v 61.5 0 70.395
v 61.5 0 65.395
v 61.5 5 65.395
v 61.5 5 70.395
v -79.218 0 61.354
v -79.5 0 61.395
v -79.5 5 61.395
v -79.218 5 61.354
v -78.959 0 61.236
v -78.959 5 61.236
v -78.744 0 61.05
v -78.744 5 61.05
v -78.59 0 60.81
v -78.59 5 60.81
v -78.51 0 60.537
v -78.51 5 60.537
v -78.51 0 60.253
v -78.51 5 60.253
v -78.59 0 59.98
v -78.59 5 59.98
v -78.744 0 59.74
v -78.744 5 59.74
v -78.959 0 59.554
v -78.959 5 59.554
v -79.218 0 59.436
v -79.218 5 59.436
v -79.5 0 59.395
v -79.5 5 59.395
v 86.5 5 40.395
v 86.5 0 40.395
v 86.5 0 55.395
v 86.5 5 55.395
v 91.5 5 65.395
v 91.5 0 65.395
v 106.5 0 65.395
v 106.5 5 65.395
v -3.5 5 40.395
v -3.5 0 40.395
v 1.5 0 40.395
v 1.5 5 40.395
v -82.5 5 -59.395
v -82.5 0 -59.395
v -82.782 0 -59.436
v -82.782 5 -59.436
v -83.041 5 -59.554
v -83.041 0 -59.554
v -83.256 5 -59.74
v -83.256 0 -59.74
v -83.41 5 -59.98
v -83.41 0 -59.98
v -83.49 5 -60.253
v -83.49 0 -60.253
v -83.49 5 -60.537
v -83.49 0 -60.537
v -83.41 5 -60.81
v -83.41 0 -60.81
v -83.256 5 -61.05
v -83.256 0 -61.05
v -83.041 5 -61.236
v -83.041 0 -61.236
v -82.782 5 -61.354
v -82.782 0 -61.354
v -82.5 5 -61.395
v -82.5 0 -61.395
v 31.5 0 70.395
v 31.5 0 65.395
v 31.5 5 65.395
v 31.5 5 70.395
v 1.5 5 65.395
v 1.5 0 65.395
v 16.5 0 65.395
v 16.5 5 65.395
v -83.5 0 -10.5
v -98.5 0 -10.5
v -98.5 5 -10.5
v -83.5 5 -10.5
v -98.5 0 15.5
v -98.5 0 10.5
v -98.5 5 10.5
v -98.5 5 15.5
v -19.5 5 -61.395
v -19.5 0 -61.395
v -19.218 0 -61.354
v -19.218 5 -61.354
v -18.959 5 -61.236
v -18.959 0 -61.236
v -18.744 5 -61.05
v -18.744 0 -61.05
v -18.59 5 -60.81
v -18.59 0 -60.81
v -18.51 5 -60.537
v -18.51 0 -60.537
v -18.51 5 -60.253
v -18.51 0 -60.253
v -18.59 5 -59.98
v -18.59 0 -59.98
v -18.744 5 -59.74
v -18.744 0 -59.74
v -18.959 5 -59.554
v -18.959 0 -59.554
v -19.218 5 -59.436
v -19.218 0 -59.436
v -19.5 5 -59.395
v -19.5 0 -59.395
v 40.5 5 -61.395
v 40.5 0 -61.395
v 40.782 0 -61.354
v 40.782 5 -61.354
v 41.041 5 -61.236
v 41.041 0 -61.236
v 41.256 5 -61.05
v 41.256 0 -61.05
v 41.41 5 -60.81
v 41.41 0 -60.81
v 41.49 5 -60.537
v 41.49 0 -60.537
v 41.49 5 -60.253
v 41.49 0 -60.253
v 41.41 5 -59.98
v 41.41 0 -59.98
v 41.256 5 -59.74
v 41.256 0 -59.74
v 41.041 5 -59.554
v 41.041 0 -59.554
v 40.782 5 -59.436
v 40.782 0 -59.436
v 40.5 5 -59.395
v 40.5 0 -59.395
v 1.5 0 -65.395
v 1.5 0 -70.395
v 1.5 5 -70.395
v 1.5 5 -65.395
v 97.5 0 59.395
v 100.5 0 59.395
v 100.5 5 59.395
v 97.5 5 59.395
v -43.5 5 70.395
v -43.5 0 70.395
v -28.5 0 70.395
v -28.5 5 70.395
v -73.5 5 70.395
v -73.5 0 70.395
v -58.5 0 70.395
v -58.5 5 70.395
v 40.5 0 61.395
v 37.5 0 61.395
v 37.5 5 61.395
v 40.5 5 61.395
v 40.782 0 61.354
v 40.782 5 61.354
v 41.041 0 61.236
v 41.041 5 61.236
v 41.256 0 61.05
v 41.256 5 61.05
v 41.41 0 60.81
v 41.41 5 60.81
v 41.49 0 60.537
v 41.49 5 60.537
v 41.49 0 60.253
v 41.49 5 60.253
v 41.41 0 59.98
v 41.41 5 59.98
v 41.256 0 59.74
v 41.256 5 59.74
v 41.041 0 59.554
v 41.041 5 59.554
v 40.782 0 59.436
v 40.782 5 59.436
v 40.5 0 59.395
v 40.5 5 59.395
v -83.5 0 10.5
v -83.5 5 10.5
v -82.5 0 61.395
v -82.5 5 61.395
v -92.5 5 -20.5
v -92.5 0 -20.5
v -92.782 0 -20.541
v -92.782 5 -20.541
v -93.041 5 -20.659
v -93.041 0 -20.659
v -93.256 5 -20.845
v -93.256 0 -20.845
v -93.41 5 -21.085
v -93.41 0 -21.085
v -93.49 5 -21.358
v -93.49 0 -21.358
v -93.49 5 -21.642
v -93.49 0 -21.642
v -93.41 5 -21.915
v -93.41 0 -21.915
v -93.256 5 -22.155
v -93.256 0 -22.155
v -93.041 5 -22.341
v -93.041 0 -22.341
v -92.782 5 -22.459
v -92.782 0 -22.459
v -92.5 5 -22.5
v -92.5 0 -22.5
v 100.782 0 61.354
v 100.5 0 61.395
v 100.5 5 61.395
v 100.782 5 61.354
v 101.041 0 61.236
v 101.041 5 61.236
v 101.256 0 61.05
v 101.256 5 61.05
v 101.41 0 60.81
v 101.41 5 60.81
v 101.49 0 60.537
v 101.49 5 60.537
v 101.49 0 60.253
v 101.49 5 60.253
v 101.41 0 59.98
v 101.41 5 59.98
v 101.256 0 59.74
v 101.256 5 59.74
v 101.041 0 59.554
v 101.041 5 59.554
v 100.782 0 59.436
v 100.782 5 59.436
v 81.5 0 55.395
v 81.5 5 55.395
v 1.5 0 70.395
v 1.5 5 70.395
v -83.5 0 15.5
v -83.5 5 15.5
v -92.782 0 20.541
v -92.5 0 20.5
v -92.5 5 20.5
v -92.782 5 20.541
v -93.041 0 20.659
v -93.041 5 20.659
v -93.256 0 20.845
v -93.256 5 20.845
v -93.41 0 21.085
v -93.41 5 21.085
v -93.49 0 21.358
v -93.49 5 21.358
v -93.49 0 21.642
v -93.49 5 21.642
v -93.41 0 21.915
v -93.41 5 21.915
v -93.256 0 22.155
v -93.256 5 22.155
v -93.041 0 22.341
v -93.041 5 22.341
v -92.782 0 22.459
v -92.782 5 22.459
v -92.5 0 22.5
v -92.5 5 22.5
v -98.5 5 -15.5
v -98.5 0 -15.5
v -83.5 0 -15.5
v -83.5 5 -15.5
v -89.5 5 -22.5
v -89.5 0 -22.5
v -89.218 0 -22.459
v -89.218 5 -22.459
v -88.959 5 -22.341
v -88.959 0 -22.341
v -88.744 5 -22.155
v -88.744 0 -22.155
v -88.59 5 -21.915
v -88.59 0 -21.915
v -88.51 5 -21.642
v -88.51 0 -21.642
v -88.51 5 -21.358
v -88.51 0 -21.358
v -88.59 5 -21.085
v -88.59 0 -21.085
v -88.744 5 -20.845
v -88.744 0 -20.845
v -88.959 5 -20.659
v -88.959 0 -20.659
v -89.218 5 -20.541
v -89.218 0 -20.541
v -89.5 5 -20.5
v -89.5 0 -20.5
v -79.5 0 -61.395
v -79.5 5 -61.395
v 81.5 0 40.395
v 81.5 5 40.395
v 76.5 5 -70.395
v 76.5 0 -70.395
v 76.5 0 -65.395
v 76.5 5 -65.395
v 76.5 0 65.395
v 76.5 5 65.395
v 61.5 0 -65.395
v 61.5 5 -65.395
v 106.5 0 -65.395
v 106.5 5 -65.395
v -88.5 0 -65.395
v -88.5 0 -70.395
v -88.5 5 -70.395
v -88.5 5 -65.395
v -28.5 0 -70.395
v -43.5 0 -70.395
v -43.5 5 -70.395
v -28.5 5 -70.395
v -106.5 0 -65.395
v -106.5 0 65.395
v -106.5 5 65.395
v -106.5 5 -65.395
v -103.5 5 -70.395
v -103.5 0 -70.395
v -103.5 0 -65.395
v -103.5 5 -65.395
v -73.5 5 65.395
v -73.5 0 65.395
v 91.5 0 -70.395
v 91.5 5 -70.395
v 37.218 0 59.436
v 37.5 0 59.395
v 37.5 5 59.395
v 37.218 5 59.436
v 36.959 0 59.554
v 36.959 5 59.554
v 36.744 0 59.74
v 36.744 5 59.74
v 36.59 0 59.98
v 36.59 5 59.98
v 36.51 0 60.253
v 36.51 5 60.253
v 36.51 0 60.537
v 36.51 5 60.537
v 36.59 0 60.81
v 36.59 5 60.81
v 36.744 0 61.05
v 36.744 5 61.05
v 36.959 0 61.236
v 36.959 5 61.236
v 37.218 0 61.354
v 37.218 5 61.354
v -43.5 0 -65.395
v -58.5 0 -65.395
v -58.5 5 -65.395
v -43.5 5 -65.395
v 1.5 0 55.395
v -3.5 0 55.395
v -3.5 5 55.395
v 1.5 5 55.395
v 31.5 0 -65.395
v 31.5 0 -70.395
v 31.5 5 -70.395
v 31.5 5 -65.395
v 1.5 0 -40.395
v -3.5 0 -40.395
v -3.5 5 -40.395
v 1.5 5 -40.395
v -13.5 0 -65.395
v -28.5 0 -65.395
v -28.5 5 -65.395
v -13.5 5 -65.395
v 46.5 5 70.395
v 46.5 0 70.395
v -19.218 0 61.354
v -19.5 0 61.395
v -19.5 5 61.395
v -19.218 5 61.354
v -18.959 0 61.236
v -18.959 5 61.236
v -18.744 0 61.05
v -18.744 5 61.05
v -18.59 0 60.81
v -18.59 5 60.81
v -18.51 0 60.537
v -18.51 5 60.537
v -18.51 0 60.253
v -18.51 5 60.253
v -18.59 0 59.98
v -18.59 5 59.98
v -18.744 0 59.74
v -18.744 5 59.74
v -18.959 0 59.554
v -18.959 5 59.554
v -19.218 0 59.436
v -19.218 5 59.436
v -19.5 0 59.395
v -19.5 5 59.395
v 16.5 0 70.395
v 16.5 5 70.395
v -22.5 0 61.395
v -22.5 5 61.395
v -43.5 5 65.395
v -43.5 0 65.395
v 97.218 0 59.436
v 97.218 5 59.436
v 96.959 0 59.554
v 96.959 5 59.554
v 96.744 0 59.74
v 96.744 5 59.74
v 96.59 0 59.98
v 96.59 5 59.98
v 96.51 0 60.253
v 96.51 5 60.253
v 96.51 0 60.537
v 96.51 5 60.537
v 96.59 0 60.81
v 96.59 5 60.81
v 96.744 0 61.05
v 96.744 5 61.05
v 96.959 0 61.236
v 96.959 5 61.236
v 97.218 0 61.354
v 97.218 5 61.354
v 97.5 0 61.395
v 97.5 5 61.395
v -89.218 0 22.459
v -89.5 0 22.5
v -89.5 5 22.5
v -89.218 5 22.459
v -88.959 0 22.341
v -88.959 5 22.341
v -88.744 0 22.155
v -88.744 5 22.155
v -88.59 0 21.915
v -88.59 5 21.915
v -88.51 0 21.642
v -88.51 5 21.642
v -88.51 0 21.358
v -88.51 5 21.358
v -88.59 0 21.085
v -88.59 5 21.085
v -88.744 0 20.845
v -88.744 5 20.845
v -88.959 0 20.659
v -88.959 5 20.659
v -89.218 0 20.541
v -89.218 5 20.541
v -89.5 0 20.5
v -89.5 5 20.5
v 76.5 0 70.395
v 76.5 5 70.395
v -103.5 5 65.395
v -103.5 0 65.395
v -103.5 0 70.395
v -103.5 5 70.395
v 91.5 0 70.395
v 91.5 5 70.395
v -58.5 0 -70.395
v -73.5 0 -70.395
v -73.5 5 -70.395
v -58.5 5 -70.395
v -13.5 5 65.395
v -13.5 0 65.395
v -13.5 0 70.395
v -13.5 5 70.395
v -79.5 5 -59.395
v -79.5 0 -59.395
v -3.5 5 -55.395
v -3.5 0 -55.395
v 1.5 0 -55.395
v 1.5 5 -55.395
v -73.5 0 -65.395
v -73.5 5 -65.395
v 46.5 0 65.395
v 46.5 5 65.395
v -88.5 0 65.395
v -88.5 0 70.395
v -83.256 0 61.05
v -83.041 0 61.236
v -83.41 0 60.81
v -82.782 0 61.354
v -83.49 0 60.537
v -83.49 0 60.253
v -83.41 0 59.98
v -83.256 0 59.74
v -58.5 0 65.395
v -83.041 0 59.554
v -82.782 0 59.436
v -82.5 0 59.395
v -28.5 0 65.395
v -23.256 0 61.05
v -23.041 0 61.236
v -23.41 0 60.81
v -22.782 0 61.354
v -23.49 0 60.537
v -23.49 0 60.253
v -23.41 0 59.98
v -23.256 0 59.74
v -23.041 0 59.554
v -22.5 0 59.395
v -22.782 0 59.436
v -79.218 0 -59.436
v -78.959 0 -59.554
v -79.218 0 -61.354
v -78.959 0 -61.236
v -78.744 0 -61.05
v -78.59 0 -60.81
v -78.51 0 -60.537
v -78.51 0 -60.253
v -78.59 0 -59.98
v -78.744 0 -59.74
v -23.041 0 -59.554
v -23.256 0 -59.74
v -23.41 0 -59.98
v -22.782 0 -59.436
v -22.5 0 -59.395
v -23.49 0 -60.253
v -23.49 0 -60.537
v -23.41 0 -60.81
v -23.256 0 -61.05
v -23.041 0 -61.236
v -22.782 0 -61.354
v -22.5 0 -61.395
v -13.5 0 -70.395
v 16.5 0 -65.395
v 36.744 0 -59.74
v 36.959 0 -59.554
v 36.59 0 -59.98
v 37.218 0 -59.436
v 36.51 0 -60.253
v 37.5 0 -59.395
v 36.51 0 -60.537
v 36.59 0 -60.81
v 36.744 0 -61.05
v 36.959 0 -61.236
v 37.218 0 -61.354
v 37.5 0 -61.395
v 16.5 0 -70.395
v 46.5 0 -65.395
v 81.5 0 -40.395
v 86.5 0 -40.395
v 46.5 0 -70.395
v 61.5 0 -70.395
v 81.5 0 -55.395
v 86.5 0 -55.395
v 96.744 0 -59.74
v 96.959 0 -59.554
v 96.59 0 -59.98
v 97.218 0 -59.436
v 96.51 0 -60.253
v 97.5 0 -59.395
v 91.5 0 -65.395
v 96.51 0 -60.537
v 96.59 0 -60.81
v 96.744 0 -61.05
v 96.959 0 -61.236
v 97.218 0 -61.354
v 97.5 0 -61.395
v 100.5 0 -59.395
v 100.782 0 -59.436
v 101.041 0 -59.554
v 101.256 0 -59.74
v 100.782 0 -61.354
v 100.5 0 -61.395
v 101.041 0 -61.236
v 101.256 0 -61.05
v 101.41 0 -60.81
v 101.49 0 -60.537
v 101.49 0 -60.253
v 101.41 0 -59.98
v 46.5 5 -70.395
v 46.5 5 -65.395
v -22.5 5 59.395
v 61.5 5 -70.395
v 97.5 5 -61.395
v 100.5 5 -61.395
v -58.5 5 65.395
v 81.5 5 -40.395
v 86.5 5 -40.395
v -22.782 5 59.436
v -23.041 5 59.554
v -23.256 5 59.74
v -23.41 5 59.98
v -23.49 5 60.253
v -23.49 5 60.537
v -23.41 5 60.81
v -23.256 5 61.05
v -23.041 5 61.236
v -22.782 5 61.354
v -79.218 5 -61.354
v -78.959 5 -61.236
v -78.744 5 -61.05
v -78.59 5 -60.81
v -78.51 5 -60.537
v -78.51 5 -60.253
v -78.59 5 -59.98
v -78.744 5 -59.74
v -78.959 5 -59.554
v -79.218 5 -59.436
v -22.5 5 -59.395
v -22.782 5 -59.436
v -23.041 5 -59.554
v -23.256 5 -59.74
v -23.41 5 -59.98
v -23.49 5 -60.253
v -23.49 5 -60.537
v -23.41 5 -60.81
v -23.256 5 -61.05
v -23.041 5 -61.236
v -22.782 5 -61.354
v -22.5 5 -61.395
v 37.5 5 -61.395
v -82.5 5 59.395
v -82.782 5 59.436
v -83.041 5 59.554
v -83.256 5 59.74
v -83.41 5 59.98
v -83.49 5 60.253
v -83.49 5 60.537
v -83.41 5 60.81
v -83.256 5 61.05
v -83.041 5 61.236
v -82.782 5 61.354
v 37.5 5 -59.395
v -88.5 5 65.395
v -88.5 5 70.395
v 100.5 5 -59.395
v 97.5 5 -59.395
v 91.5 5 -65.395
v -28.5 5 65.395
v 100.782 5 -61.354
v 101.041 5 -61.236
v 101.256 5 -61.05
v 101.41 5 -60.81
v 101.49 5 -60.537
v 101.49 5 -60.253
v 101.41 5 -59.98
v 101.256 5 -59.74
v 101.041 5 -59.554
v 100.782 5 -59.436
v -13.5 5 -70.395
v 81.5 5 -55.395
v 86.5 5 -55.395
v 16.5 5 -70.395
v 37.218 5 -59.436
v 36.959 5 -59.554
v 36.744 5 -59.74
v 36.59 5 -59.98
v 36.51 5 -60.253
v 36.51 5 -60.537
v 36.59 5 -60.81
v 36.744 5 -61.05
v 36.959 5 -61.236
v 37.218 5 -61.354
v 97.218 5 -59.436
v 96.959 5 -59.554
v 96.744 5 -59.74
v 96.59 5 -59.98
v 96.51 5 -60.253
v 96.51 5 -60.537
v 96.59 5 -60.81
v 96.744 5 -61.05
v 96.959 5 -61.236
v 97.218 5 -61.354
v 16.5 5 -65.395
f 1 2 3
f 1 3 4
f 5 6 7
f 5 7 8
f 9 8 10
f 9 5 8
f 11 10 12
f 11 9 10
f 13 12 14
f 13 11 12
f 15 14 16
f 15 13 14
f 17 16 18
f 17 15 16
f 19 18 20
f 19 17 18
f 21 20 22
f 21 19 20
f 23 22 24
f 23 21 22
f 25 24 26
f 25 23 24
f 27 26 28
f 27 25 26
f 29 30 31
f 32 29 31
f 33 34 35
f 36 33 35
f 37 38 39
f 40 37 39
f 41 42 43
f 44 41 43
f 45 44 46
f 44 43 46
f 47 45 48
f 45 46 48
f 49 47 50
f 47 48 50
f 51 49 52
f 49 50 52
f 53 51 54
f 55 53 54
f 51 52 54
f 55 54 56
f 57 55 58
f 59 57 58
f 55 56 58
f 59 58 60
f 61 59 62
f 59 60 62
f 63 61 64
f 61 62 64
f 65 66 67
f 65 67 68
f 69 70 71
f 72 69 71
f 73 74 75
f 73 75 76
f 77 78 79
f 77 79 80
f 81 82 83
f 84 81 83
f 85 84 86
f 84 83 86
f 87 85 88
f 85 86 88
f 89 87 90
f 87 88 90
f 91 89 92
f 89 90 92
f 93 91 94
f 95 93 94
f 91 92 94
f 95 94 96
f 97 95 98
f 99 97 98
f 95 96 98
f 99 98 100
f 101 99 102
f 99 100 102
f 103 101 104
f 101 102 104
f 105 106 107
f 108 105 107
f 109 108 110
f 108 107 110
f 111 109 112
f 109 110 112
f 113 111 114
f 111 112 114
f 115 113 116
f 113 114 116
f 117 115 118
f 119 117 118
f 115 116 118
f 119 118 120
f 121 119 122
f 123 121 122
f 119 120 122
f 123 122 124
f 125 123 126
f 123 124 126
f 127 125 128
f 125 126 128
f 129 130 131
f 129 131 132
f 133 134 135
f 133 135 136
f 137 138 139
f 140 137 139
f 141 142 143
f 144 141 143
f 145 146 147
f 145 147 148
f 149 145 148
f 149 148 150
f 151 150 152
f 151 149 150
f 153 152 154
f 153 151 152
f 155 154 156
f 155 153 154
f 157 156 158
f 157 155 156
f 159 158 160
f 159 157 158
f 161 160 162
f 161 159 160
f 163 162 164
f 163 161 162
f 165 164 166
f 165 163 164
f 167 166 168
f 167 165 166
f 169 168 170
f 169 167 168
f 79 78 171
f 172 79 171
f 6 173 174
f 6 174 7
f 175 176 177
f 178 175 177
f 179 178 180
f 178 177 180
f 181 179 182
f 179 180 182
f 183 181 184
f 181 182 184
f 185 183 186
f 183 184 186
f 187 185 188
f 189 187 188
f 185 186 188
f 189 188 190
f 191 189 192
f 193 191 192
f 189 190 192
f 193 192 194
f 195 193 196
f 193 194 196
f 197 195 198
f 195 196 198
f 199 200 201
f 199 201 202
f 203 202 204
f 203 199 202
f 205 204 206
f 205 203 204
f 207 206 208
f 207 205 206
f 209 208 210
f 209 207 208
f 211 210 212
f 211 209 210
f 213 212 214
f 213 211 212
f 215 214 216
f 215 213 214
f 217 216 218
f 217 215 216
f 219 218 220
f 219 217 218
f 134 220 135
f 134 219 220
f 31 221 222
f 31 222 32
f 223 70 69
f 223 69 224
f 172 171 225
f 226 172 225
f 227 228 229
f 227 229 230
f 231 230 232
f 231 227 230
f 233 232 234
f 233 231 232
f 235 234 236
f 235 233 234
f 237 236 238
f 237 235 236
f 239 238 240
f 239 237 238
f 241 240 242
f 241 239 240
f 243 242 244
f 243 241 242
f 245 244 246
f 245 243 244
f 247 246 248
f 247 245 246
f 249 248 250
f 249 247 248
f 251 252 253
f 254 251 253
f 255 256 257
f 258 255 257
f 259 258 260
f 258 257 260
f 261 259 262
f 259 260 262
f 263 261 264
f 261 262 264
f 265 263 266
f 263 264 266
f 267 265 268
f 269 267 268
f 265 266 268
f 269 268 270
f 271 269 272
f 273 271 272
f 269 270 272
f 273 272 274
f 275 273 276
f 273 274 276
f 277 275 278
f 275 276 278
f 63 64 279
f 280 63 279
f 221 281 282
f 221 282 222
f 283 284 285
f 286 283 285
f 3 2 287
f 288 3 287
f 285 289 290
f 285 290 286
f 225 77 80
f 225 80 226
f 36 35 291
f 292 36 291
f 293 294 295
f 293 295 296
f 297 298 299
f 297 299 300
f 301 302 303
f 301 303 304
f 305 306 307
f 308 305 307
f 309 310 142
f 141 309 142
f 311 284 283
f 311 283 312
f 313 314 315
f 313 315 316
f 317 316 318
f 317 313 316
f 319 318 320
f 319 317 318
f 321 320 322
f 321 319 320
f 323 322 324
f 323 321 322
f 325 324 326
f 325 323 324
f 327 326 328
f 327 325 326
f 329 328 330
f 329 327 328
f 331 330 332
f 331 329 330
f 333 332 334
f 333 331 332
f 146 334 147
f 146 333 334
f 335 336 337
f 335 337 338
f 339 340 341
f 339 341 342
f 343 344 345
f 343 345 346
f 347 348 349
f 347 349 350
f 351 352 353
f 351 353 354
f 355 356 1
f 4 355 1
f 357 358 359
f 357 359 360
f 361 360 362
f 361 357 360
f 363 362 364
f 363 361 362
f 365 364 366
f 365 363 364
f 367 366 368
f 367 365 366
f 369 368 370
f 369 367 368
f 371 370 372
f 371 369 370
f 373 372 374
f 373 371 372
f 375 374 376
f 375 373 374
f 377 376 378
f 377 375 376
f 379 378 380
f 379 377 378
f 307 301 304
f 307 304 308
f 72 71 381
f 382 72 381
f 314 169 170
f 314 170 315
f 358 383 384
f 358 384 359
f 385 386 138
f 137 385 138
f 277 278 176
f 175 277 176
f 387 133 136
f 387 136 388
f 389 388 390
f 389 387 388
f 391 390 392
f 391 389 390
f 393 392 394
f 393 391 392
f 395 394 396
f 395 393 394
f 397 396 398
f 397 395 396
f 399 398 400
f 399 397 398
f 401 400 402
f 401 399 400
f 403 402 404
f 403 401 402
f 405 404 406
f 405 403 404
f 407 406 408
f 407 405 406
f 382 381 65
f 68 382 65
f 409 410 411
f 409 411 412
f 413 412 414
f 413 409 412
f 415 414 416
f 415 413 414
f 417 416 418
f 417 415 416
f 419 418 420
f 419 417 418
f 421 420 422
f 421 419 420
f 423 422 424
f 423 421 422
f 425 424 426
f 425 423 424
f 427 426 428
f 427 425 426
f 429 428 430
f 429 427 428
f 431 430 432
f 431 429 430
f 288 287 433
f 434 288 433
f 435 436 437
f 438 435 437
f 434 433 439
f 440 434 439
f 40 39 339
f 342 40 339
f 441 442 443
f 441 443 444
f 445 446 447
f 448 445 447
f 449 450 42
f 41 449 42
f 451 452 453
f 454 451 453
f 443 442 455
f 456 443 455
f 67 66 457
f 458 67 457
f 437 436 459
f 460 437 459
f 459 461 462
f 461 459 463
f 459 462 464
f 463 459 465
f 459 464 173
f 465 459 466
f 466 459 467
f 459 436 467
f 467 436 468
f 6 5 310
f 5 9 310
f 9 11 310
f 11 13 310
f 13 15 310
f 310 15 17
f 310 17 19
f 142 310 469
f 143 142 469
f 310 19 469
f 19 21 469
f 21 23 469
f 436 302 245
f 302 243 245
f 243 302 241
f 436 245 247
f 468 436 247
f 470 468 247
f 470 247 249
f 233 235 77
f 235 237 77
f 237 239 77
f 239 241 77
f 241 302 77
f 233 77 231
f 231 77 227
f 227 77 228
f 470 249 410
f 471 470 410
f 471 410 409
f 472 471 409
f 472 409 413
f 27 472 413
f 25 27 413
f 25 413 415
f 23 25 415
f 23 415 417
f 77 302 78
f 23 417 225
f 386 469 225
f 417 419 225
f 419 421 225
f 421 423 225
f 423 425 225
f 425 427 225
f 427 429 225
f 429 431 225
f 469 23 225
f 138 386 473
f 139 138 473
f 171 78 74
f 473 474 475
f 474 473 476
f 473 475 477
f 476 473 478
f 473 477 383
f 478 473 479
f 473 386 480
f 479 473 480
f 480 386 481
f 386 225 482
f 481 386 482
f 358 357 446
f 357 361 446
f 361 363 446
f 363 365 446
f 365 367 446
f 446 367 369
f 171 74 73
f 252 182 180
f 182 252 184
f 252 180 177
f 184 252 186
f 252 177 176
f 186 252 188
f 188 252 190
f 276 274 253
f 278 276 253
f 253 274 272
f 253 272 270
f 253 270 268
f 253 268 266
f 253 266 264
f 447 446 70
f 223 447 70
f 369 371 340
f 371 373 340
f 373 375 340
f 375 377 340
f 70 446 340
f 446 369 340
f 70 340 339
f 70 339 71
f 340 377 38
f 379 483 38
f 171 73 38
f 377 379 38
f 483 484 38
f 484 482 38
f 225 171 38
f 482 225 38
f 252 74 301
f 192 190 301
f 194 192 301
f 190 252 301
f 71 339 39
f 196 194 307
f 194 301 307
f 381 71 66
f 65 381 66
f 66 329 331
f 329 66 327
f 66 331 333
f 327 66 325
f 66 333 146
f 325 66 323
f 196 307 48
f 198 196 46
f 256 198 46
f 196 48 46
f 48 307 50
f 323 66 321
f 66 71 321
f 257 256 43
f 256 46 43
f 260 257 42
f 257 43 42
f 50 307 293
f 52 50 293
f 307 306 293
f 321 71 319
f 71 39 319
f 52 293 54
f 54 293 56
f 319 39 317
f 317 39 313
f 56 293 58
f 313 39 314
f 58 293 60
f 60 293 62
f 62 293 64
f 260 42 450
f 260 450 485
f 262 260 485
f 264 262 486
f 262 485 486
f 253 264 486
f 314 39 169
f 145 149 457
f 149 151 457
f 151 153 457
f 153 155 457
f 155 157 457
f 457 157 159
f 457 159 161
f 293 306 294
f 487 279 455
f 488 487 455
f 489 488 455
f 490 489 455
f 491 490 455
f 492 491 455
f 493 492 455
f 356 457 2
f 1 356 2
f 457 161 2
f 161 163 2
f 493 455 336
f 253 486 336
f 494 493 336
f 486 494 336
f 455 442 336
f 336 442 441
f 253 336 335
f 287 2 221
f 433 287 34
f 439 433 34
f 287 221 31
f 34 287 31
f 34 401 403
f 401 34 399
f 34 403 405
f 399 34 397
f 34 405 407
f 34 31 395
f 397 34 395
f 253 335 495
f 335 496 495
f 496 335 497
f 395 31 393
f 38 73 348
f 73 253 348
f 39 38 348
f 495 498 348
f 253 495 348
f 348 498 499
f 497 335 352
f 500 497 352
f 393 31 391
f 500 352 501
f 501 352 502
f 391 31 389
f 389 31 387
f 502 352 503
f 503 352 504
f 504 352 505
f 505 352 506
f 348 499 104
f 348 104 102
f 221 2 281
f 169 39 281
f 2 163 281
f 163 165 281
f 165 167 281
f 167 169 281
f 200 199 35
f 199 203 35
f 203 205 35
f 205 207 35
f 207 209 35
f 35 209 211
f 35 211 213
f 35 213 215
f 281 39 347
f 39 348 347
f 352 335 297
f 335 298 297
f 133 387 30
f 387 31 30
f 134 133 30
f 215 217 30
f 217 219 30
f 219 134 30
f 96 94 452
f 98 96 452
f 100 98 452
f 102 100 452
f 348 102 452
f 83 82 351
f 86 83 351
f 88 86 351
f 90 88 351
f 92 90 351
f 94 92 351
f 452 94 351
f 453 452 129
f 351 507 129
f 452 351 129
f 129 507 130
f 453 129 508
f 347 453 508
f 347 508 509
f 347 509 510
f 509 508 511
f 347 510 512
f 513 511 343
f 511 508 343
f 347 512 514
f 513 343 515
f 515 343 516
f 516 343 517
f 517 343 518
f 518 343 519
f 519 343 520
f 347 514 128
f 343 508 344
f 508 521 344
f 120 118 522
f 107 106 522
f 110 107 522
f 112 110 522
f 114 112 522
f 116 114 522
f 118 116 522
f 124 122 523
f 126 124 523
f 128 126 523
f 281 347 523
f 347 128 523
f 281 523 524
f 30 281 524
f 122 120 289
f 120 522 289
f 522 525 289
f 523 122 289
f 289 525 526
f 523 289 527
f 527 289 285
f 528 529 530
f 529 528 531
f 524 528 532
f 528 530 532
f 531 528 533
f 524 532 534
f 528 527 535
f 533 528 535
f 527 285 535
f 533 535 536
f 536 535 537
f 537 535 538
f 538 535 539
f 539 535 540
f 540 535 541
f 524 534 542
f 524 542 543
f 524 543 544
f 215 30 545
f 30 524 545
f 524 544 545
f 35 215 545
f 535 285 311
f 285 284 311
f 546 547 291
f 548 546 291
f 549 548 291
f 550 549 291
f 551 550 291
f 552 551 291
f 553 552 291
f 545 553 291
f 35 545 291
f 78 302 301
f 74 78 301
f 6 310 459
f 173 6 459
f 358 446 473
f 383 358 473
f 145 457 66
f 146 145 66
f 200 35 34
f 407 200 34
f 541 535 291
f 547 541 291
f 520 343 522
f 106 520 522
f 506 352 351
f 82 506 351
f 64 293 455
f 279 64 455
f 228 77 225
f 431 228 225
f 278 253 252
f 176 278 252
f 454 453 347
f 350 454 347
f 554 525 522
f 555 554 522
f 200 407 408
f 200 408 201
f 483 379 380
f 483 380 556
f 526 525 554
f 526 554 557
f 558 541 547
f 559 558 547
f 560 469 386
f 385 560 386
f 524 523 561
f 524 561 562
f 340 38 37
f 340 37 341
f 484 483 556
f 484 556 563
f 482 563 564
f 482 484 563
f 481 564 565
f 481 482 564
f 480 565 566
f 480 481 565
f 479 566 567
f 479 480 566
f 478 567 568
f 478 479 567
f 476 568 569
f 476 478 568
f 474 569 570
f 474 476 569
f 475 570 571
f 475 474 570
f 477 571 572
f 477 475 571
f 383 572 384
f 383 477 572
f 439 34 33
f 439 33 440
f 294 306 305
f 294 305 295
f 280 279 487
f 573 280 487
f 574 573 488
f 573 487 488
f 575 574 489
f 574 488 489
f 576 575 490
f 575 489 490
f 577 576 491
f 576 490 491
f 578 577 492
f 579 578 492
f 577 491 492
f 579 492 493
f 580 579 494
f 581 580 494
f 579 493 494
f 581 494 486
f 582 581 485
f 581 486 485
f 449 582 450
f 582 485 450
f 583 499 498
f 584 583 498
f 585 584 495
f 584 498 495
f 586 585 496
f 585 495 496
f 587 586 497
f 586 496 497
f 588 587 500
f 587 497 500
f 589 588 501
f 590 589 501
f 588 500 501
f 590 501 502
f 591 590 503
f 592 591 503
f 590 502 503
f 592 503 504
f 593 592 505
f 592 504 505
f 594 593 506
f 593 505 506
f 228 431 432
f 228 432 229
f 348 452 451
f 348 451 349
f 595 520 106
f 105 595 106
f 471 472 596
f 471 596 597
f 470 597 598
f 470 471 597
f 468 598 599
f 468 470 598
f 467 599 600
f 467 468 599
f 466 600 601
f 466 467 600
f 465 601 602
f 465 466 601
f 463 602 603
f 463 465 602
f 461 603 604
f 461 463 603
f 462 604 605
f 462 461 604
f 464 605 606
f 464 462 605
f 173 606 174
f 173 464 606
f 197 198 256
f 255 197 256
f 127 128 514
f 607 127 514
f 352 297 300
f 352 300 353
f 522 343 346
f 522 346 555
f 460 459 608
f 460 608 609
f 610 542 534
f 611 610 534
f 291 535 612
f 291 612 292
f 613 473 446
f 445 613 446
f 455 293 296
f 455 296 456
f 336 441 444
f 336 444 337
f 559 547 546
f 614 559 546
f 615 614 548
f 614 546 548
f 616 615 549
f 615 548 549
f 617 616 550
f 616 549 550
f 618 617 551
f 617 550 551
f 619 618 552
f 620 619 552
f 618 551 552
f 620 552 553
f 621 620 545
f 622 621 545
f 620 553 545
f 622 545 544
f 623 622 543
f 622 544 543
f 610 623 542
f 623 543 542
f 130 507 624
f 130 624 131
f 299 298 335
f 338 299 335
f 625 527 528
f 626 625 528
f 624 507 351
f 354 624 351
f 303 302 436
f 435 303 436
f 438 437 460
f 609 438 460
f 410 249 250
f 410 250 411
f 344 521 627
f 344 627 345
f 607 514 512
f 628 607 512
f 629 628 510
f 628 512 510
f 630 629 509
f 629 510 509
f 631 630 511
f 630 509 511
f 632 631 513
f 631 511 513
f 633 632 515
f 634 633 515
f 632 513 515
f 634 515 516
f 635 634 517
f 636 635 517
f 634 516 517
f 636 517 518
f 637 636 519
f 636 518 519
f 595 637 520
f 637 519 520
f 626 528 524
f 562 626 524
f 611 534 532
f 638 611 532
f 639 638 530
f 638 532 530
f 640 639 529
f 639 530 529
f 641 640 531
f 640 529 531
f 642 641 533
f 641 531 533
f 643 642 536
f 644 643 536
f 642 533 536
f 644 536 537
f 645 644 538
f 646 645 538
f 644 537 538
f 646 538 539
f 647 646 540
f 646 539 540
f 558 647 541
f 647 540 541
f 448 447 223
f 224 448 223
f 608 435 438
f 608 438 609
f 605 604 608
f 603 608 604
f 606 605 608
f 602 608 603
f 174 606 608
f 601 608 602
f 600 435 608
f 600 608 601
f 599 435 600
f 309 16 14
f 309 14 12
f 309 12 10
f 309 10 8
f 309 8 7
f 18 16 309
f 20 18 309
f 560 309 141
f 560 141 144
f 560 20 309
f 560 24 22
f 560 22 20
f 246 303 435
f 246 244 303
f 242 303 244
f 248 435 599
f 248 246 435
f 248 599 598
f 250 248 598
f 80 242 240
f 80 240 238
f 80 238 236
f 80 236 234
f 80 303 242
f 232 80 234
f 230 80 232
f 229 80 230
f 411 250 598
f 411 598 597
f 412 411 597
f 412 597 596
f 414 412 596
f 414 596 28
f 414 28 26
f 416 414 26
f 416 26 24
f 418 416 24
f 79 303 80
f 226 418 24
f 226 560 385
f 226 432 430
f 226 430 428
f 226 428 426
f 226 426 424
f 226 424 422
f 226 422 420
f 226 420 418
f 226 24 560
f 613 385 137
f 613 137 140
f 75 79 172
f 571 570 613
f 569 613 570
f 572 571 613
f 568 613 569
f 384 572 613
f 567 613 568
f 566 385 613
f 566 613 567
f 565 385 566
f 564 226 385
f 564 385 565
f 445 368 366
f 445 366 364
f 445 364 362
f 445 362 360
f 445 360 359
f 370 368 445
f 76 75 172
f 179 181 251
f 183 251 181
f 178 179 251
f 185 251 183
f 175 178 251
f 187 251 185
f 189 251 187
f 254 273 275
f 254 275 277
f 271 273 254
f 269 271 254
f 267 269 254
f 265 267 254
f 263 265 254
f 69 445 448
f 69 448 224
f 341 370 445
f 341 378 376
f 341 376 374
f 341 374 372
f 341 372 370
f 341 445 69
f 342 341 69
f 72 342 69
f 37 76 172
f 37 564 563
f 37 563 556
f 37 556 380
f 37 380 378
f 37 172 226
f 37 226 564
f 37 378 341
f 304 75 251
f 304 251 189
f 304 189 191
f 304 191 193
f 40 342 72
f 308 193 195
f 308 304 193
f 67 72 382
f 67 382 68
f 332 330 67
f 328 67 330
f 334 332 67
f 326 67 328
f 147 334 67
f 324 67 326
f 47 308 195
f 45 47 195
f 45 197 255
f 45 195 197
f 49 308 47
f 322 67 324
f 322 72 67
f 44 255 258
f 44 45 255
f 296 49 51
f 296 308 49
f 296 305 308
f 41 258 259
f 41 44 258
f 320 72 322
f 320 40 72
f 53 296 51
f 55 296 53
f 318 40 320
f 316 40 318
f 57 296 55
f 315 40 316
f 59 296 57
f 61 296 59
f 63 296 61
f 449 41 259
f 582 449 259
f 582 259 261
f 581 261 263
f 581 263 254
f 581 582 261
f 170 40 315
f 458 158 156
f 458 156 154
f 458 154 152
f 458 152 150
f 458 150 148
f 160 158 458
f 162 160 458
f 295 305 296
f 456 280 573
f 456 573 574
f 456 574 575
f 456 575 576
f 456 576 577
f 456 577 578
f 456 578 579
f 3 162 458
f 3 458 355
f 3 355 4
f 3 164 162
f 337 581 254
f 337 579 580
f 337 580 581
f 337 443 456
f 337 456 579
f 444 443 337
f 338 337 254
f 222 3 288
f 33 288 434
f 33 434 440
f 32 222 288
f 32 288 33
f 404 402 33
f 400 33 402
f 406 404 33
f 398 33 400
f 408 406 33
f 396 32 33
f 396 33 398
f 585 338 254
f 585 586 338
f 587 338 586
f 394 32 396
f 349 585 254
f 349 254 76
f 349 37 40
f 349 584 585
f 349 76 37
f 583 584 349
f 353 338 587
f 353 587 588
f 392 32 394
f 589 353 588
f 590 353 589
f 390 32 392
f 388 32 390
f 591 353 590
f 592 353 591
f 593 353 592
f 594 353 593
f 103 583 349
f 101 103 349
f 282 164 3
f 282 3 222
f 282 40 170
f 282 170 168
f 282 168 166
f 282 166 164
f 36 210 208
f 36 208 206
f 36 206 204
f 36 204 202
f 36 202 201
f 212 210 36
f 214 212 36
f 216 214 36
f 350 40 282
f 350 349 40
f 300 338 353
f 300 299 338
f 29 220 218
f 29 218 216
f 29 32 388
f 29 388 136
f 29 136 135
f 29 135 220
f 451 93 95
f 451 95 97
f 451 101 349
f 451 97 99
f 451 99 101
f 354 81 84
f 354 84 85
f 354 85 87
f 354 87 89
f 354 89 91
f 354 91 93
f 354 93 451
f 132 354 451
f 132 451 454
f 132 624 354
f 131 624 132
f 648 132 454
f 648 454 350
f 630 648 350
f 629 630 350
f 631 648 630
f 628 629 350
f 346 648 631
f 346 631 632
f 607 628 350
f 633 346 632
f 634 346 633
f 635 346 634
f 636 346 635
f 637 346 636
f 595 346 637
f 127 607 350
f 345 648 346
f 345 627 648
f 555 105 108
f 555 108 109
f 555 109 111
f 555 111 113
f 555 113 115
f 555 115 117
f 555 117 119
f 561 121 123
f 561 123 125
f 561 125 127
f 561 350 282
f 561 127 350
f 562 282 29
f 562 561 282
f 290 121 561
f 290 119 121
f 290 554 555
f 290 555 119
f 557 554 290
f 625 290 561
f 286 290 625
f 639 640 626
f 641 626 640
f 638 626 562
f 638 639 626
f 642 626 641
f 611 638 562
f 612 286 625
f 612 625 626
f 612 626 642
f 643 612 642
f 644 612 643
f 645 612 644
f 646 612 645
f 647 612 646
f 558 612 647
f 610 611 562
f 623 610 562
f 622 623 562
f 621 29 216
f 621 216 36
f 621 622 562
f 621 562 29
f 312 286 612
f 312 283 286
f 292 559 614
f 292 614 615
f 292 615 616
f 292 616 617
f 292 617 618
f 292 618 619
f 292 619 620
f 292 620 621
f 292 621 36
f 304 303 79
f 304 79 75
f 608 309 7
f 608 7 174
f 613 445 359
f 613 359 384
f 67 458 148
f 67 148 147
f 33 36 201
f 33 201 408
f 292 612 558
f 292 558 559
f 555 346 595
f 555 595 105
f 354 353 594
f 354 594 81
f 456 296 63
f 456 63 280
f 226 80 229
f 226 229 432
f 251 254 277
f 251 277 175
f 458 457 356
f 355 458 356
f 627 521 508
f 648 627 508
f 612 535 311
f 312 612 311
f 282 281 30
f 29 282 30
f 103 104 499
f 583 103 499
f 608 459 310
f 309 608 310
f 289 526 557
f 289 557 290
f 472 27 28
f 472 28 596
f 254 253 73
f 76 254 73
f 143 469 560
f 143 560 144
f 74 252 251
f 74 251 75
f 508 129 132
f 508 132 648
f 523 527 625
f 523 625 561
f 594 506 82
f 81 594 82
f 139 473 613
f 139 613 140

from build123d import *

# Parameters (mm, degrees)
SKETCH1_W                 = 213
SKETCH1_H                 = 140.79
BOSS_EXTRUDE1_DEPTH       = 5
SKETCH2_W                 = 15
SKETCH2_H                 = 5
CUT_EXTRUDE1_DEPTH        = 128.760346059
CUT_EXTRUDE3_DEPTH        = 128.760346059
LPATTERN2_COUNT           = 4
LPATTERN2_PITCH           = 60
LPATTERN1_COUNT           = 7
LPATTERN1_PITCH           = 30
LPATTERN1_COPY_1_SKETCH_W = 15
LPATTERN1_COPY_1_SKETCH_H = 5
LPATTERN1_COPY_1_DEPTH    = 128.760346059
LPATTERN1_COPY_2_SKETCH_W = 15
LPATTERN1_COPY_2_SKETCH_H = 5
LPATTERN1_COPY_2_DEPTH    = 128.760346059
LPATTERN1_COPY_3_SKETCH_W = 15
LPATTERN1_COPY_3_SKETCH_H = 5
LPATTERN1_COPY_3_DEPTH    = 128.760346059
LPATTERN1_COPY_4_SKETCH_W = 15
LPATTERN1_COPY_4_SKETCH_H = 5
LPATTERN1_COPY_4_DEPTH    = 128.760346059
LPATTERN1_COPY_5_SKETCH_W = 15
LPATTERN1_COPY_5_SKETCH_H = 5
LPATTERN1_COPY_5_DEPTH    = 128.760346059
LPATTERN1_COPY_6_SKETCH_W = 15
LPATTERN1_COPY_6_SKETCH_H = 5
LPATTERN1_COPY_6_DEPTH    = 128.760346059
SKETCH3_W                 = 5
SKETCH3_H                 = 15
SKETCH3_W_2               = 15
SKETCH3_H_2               = 5
CUT_EXTRUDE2_DEPTH        = 128.760346059
MIRROR2_COPY_1_DEPTH      = 128.760346059
MIRROR2_COPY_2_DEPTH      = 128.760346059
MIRROR2_COPY_3_DEPTH      = 128.760346059
CUT_EXTRUDE4_DEPTH        = 128.760346059
SKETCH7_W                 = 3
SKETCH7_H                 = 5
CUT_EXTRUDE5_DEPTH        = 128.760346059


with BuildPart() as part:
    # Sketch1 → Boss-Extrude1 (new body)
    with BuildSketch(Plane(origin=(0, 0, 0), x_dir=(1, 0, 0), z_dir=(0, 1, 0))):
        Rectangle(SKETCH1_W, SKETCH1_H)
    extrude(amount=BOSS_EXTRUDE1_DEPTH)

    # Sketch2 → Cut-Extrude1 (cut, through all)
    with BuildSketch(Plane.XZ):
        with Locations((99, 67.895)):
            Rectangle(SKETCH2_W, SKETCH2_H)
    cut_extrude1 = extrude(amount=-CUT_EXTRUDE1_DEPTH, mode=Mode.SUBTRACT)

    # Sketch5 → Cut-Extrude3 (cut, through all)
    with BuildSketch(Plane.XZ):
        with BuildLine():
            Line((100.5, 59.395), (97.5, 59.395))
            ThreePointArc((97.5, 59.395), (96.5, 60.395), (97.5, 61.395))
            Line((97.5, 61.395), (100.5, 61.395))
            ThreePointArc((100.5, 61.395), (101.5, 60.395), (100.5, 59.395))
        make_face()
    cut_extrude3 = extrude(amount=-CUT_EXTRUDE3_DEPTH, mode=Mode.SUBTRACT)

    # LPattern2: Cut-Extrude3 ×4
    with Locations(*[(-i * LPATTERN2_PITCH, 0, 0) for i in range(1, LPATTERN2_COUNT)]):
        add(cut_extrude3, mode=Mode.SUBTRACT)

    # Mirror1: Cut-Extrude1 across plane
    add(cut_extrude1.mirror(Plane.XY), mode=Mode.SUBTRACT)

    # LPattern1: Cut-Extrude1 ×7
    with Locations(*[(-i * LPATTERN1_PITCH, 0, 0) for i in range(1, LPATTERN1_COUNT)]):
        add(cut_extrude1, mode=Mode.SUBTRACT)

    # LPattern1 copy 1 sketch → LPattern1 copy 1 (cut, through all)
    with BuildSketch(Plane(origin=(-30, 0, 0), x_dir=(1, 0, 0), z_dir=(0, -1, 0))):
        with Locations((99, -67.895)):
            Rectangle(LPATTERN1_COPY_1_SKETCH_W, LPATTERN1_COPY_1_SKETCH_H)
    extrude(amount=-LPATTERN1_COPY_1_DEPTH, mode=Mode.SUBTRACT)

    # LPattern1 copy 2 sketch → LPattern1 copy 2 (cut, through all)
    with BuildSketch(Plane(origin=(-60, 0, 0), x_dir=(1, 0, 0), z_dir=(0, -1, 0))):
        with Locations((99, -67.895)):
            Rectangle(LPATTERN1_COPY_2_SKETCH_W, LPATTERN1_COPY_2_SKETCH_H)
    extrude(amount=-LPATTERN1_COPY_2_DEPTH, mode=Mode.SUBTRACT)

    # LPattern1 copy 3 sketch → LPattern1 copy 3 (cut, through all)
    with BuildSketch(Plane(origin=(-90, 0, 0), x_dir=(1, 0, 0), z_dir=(0, -1, 0))):
        with Locations((99, -67.895)):
            Rectangle(LPATTERN1_COPY_3_SKETCH_W, LPATTERN1_COPY_3_SKETCH_H)
    extrude(amount=-LPATTERN1_COPY_3_DEPTH, mode=Mode.SUBTRACT)

    # LPattern1 copy 4 sketch → LPattern1 copy 4 (cut, through all)
    with BuildSketch(Plane(origin=(-120, 0, 0), x_dir=(1, 0, 0), z_dir=(0, -1, 0))):
        with Locations((99, -67.895)):
            Rectangle(LPATTERN1_COPY_4_SKETCH_W, LPATTERN1_COPY_4_SKETCH_H)
    extrude(amount=-LPATTERN1_COPY_4_DEPTH, mode=Mode.SUBTRACT)

    # LPattern1 copy 5 sketch → LPattern1 copy 5 (cut, through all)
    with BuildSketch(Plane(origin=(-150, 0, 0), x_dir=(1, 0, 0), z_dir=(0, -1, 0))):
        with Locations((99, -67.895)):
            Rectangle(LPATTERN1_COPY_5_SKETCH_W, LPATTERN1_COPY_5_SKETCH_H)
    extrude(amount=-LPATTERN1_COPY_5_DEPTH, mode=Mode.SUBTRACT)

    # LPattern1 copy 6 sketch → LPattern1 copy 6 (cut, through all)
    with BuildSketch(Plane(origin=(-180, 0, 0), x_dir=(1, 0, 0), z_dir=(0, -1, 0))):
        with Locations((99, -67.895)):
            Rectangle(LPATTERN1_COPY_6_SKETCH_W, LPATTERN1_COPY_6_SKETCH_H)
    extrude(amount=-LPATTERN1_COPY_6_DEPTH, mode=Mode.SUBTRACT)

    # Sketch3 → Cut-Extrude2 (cut, through all)
    with BuildSketch(Plane.XZ):
        with Locations((-1, 47.895)):
            Rectangle(SKETCH3_W, SKETCH3_H)
        with Locations((-1, -47.895)):
            Rectangle(SKETCH3_W, SKETCH3_H)
        with Locations((84, -47.895)):
            Rectangle(SKETCH3_W, SKETCH3_H)
        with Locations((84, 47.895)):
            Rectangle(SKETCH3_W, SKETCH3_H)
        with Locations((-91, 13)):
            Rectangle(SKETCH3_W_2, SKETCH3_H_2)
        with Locations((-91, -13)):
            Rectangle(SKETCH3_W_2, SKETCH3_H_2)
    extrude(amount=-CUT_EXTRUDE2_DEPTH, mode=Mode.SUBTRACT)

    # Mirror2: Cut-Extrude3 across plane
    add(cut_extrude3.mirror(Plane.XY), mode=Mode.SUBTRACT)

    # Mirror2 copy 1 sketch → Mirror2 copy 1 (cut, through all)
    with BuildSketch(Plane(origin=(-60, 0, 0), x_dir=(1, 0, 0), z_dir=(0, -1, 0))):
        with BuildLine():
            Line((100.5, -59.395), (97.5, -59.395))
            ThreePointArc((97.5, -59.395), (96.5, -60.395), (97.5, -61.395))
            Line((97.5, -61.395), (100.5, -61.395))
            ThreePointArc((100.5, -61.395), (101.5, -60.395), (100.5, -59.395))
        make_face()
    extrude(amount=-MIRROR2_COPY_1_DEPTH, mode=Mode.SUBTRACT)

    # Mirror2 copy 2 sketch → Mirror2 copy 2 (cut, through all)
    with BuildSketch(Plane(origin=(-120, 0, 0), x_dir=(1, 0, 0), z_dir=(0, -1, 0))):
        with BuildLine():
            Line((100.5, -59.395), (97.5, -59.395))
            ThreePointArc((97.5, -59.395), (96.5, -60.395), (97.5, -61.395))
            Line((97.5, -61.395), (100.5, -61.395))
            ThreePointArc((100.5, -61.395), (101.5, -60.395), (100.5, -59.395))
        make_face()
    extrude(amount=-MIRROR2_COPY_2_DEPTH, mode=Mode.SUBTRACT)

    # Mirror2 copy 3 sketch → Mirror2 copy 3 (cut, through all)
    with BuildSketch(Plane(origin=(-180, 0, 0), x_dir=(1, 0, 0), z_dir=(0, -1, 0))):
        with BuildLine():
            Line((100.5, -59.395), (97.5, -59.395))
            ThreePointArc((97.5, -59.395), (96.5, -60.395), (97.5, -61.395))
            Line((97.5, -61.395), (100.5, -61.395))
            ThreePointArc((100.5, -61.395), (101.5, -60.395), (100.5, -59.395))
        make_face()
    extrude(amount=-MIRROR2_COPY_3_DEPTH, mode=Mode.SUBTRACT)

    # Sketch6 → Cut-Extrude4 (cut, through all)
    with BuildSketch(Plane.XZ):
        with BuildLine():
            Line((-92.5, 22.5), (-89.5, 22.5))
            ThreePointArc((-89.5, 22.5), (-88.5, 21.5), (-89.5, 20.5))
            Line((-89.5, 20.5), (-92.5, 20.5))
            ThreePointArc((-92.5, 20.5), (-93.5, 21.5), (-92.5, 22.5))
        make_face()
        with BuildLine():
            Line((-92.5, -22.5), (-89.5, -22.5))
            ThreePointArc((-89.5, -22.5), (-88.5, -21.5), (-89.5, -20.5))
            Line((-89.5, -20.5), (-92.5, -20.5))
            ThreePointArc((-92.5, -20.5), (-93.5, -21.5), (-92.5, -22.5))
        make_face()
    extrude(amount=-CUT_EXTRUDE4_DEPTH, mode=Mode.SUBTRACT)

    # Sketch7 → Cut-Extrude5 (cut, through all)
    with BuildSketch(Plane.XZ):
        with Locations((-105, 67.895)):
            Rectangle(SKETCH7_W, SKETCH7_H)
        with Locations((-105, -67.895)):
            Rectangle(SKETCH7_W, SKETCH7_H)
    extrude(amount=-CUT_EXTRUDE5_DEPTH, mode=Mode.SUBTRACT)


solid = part.part
